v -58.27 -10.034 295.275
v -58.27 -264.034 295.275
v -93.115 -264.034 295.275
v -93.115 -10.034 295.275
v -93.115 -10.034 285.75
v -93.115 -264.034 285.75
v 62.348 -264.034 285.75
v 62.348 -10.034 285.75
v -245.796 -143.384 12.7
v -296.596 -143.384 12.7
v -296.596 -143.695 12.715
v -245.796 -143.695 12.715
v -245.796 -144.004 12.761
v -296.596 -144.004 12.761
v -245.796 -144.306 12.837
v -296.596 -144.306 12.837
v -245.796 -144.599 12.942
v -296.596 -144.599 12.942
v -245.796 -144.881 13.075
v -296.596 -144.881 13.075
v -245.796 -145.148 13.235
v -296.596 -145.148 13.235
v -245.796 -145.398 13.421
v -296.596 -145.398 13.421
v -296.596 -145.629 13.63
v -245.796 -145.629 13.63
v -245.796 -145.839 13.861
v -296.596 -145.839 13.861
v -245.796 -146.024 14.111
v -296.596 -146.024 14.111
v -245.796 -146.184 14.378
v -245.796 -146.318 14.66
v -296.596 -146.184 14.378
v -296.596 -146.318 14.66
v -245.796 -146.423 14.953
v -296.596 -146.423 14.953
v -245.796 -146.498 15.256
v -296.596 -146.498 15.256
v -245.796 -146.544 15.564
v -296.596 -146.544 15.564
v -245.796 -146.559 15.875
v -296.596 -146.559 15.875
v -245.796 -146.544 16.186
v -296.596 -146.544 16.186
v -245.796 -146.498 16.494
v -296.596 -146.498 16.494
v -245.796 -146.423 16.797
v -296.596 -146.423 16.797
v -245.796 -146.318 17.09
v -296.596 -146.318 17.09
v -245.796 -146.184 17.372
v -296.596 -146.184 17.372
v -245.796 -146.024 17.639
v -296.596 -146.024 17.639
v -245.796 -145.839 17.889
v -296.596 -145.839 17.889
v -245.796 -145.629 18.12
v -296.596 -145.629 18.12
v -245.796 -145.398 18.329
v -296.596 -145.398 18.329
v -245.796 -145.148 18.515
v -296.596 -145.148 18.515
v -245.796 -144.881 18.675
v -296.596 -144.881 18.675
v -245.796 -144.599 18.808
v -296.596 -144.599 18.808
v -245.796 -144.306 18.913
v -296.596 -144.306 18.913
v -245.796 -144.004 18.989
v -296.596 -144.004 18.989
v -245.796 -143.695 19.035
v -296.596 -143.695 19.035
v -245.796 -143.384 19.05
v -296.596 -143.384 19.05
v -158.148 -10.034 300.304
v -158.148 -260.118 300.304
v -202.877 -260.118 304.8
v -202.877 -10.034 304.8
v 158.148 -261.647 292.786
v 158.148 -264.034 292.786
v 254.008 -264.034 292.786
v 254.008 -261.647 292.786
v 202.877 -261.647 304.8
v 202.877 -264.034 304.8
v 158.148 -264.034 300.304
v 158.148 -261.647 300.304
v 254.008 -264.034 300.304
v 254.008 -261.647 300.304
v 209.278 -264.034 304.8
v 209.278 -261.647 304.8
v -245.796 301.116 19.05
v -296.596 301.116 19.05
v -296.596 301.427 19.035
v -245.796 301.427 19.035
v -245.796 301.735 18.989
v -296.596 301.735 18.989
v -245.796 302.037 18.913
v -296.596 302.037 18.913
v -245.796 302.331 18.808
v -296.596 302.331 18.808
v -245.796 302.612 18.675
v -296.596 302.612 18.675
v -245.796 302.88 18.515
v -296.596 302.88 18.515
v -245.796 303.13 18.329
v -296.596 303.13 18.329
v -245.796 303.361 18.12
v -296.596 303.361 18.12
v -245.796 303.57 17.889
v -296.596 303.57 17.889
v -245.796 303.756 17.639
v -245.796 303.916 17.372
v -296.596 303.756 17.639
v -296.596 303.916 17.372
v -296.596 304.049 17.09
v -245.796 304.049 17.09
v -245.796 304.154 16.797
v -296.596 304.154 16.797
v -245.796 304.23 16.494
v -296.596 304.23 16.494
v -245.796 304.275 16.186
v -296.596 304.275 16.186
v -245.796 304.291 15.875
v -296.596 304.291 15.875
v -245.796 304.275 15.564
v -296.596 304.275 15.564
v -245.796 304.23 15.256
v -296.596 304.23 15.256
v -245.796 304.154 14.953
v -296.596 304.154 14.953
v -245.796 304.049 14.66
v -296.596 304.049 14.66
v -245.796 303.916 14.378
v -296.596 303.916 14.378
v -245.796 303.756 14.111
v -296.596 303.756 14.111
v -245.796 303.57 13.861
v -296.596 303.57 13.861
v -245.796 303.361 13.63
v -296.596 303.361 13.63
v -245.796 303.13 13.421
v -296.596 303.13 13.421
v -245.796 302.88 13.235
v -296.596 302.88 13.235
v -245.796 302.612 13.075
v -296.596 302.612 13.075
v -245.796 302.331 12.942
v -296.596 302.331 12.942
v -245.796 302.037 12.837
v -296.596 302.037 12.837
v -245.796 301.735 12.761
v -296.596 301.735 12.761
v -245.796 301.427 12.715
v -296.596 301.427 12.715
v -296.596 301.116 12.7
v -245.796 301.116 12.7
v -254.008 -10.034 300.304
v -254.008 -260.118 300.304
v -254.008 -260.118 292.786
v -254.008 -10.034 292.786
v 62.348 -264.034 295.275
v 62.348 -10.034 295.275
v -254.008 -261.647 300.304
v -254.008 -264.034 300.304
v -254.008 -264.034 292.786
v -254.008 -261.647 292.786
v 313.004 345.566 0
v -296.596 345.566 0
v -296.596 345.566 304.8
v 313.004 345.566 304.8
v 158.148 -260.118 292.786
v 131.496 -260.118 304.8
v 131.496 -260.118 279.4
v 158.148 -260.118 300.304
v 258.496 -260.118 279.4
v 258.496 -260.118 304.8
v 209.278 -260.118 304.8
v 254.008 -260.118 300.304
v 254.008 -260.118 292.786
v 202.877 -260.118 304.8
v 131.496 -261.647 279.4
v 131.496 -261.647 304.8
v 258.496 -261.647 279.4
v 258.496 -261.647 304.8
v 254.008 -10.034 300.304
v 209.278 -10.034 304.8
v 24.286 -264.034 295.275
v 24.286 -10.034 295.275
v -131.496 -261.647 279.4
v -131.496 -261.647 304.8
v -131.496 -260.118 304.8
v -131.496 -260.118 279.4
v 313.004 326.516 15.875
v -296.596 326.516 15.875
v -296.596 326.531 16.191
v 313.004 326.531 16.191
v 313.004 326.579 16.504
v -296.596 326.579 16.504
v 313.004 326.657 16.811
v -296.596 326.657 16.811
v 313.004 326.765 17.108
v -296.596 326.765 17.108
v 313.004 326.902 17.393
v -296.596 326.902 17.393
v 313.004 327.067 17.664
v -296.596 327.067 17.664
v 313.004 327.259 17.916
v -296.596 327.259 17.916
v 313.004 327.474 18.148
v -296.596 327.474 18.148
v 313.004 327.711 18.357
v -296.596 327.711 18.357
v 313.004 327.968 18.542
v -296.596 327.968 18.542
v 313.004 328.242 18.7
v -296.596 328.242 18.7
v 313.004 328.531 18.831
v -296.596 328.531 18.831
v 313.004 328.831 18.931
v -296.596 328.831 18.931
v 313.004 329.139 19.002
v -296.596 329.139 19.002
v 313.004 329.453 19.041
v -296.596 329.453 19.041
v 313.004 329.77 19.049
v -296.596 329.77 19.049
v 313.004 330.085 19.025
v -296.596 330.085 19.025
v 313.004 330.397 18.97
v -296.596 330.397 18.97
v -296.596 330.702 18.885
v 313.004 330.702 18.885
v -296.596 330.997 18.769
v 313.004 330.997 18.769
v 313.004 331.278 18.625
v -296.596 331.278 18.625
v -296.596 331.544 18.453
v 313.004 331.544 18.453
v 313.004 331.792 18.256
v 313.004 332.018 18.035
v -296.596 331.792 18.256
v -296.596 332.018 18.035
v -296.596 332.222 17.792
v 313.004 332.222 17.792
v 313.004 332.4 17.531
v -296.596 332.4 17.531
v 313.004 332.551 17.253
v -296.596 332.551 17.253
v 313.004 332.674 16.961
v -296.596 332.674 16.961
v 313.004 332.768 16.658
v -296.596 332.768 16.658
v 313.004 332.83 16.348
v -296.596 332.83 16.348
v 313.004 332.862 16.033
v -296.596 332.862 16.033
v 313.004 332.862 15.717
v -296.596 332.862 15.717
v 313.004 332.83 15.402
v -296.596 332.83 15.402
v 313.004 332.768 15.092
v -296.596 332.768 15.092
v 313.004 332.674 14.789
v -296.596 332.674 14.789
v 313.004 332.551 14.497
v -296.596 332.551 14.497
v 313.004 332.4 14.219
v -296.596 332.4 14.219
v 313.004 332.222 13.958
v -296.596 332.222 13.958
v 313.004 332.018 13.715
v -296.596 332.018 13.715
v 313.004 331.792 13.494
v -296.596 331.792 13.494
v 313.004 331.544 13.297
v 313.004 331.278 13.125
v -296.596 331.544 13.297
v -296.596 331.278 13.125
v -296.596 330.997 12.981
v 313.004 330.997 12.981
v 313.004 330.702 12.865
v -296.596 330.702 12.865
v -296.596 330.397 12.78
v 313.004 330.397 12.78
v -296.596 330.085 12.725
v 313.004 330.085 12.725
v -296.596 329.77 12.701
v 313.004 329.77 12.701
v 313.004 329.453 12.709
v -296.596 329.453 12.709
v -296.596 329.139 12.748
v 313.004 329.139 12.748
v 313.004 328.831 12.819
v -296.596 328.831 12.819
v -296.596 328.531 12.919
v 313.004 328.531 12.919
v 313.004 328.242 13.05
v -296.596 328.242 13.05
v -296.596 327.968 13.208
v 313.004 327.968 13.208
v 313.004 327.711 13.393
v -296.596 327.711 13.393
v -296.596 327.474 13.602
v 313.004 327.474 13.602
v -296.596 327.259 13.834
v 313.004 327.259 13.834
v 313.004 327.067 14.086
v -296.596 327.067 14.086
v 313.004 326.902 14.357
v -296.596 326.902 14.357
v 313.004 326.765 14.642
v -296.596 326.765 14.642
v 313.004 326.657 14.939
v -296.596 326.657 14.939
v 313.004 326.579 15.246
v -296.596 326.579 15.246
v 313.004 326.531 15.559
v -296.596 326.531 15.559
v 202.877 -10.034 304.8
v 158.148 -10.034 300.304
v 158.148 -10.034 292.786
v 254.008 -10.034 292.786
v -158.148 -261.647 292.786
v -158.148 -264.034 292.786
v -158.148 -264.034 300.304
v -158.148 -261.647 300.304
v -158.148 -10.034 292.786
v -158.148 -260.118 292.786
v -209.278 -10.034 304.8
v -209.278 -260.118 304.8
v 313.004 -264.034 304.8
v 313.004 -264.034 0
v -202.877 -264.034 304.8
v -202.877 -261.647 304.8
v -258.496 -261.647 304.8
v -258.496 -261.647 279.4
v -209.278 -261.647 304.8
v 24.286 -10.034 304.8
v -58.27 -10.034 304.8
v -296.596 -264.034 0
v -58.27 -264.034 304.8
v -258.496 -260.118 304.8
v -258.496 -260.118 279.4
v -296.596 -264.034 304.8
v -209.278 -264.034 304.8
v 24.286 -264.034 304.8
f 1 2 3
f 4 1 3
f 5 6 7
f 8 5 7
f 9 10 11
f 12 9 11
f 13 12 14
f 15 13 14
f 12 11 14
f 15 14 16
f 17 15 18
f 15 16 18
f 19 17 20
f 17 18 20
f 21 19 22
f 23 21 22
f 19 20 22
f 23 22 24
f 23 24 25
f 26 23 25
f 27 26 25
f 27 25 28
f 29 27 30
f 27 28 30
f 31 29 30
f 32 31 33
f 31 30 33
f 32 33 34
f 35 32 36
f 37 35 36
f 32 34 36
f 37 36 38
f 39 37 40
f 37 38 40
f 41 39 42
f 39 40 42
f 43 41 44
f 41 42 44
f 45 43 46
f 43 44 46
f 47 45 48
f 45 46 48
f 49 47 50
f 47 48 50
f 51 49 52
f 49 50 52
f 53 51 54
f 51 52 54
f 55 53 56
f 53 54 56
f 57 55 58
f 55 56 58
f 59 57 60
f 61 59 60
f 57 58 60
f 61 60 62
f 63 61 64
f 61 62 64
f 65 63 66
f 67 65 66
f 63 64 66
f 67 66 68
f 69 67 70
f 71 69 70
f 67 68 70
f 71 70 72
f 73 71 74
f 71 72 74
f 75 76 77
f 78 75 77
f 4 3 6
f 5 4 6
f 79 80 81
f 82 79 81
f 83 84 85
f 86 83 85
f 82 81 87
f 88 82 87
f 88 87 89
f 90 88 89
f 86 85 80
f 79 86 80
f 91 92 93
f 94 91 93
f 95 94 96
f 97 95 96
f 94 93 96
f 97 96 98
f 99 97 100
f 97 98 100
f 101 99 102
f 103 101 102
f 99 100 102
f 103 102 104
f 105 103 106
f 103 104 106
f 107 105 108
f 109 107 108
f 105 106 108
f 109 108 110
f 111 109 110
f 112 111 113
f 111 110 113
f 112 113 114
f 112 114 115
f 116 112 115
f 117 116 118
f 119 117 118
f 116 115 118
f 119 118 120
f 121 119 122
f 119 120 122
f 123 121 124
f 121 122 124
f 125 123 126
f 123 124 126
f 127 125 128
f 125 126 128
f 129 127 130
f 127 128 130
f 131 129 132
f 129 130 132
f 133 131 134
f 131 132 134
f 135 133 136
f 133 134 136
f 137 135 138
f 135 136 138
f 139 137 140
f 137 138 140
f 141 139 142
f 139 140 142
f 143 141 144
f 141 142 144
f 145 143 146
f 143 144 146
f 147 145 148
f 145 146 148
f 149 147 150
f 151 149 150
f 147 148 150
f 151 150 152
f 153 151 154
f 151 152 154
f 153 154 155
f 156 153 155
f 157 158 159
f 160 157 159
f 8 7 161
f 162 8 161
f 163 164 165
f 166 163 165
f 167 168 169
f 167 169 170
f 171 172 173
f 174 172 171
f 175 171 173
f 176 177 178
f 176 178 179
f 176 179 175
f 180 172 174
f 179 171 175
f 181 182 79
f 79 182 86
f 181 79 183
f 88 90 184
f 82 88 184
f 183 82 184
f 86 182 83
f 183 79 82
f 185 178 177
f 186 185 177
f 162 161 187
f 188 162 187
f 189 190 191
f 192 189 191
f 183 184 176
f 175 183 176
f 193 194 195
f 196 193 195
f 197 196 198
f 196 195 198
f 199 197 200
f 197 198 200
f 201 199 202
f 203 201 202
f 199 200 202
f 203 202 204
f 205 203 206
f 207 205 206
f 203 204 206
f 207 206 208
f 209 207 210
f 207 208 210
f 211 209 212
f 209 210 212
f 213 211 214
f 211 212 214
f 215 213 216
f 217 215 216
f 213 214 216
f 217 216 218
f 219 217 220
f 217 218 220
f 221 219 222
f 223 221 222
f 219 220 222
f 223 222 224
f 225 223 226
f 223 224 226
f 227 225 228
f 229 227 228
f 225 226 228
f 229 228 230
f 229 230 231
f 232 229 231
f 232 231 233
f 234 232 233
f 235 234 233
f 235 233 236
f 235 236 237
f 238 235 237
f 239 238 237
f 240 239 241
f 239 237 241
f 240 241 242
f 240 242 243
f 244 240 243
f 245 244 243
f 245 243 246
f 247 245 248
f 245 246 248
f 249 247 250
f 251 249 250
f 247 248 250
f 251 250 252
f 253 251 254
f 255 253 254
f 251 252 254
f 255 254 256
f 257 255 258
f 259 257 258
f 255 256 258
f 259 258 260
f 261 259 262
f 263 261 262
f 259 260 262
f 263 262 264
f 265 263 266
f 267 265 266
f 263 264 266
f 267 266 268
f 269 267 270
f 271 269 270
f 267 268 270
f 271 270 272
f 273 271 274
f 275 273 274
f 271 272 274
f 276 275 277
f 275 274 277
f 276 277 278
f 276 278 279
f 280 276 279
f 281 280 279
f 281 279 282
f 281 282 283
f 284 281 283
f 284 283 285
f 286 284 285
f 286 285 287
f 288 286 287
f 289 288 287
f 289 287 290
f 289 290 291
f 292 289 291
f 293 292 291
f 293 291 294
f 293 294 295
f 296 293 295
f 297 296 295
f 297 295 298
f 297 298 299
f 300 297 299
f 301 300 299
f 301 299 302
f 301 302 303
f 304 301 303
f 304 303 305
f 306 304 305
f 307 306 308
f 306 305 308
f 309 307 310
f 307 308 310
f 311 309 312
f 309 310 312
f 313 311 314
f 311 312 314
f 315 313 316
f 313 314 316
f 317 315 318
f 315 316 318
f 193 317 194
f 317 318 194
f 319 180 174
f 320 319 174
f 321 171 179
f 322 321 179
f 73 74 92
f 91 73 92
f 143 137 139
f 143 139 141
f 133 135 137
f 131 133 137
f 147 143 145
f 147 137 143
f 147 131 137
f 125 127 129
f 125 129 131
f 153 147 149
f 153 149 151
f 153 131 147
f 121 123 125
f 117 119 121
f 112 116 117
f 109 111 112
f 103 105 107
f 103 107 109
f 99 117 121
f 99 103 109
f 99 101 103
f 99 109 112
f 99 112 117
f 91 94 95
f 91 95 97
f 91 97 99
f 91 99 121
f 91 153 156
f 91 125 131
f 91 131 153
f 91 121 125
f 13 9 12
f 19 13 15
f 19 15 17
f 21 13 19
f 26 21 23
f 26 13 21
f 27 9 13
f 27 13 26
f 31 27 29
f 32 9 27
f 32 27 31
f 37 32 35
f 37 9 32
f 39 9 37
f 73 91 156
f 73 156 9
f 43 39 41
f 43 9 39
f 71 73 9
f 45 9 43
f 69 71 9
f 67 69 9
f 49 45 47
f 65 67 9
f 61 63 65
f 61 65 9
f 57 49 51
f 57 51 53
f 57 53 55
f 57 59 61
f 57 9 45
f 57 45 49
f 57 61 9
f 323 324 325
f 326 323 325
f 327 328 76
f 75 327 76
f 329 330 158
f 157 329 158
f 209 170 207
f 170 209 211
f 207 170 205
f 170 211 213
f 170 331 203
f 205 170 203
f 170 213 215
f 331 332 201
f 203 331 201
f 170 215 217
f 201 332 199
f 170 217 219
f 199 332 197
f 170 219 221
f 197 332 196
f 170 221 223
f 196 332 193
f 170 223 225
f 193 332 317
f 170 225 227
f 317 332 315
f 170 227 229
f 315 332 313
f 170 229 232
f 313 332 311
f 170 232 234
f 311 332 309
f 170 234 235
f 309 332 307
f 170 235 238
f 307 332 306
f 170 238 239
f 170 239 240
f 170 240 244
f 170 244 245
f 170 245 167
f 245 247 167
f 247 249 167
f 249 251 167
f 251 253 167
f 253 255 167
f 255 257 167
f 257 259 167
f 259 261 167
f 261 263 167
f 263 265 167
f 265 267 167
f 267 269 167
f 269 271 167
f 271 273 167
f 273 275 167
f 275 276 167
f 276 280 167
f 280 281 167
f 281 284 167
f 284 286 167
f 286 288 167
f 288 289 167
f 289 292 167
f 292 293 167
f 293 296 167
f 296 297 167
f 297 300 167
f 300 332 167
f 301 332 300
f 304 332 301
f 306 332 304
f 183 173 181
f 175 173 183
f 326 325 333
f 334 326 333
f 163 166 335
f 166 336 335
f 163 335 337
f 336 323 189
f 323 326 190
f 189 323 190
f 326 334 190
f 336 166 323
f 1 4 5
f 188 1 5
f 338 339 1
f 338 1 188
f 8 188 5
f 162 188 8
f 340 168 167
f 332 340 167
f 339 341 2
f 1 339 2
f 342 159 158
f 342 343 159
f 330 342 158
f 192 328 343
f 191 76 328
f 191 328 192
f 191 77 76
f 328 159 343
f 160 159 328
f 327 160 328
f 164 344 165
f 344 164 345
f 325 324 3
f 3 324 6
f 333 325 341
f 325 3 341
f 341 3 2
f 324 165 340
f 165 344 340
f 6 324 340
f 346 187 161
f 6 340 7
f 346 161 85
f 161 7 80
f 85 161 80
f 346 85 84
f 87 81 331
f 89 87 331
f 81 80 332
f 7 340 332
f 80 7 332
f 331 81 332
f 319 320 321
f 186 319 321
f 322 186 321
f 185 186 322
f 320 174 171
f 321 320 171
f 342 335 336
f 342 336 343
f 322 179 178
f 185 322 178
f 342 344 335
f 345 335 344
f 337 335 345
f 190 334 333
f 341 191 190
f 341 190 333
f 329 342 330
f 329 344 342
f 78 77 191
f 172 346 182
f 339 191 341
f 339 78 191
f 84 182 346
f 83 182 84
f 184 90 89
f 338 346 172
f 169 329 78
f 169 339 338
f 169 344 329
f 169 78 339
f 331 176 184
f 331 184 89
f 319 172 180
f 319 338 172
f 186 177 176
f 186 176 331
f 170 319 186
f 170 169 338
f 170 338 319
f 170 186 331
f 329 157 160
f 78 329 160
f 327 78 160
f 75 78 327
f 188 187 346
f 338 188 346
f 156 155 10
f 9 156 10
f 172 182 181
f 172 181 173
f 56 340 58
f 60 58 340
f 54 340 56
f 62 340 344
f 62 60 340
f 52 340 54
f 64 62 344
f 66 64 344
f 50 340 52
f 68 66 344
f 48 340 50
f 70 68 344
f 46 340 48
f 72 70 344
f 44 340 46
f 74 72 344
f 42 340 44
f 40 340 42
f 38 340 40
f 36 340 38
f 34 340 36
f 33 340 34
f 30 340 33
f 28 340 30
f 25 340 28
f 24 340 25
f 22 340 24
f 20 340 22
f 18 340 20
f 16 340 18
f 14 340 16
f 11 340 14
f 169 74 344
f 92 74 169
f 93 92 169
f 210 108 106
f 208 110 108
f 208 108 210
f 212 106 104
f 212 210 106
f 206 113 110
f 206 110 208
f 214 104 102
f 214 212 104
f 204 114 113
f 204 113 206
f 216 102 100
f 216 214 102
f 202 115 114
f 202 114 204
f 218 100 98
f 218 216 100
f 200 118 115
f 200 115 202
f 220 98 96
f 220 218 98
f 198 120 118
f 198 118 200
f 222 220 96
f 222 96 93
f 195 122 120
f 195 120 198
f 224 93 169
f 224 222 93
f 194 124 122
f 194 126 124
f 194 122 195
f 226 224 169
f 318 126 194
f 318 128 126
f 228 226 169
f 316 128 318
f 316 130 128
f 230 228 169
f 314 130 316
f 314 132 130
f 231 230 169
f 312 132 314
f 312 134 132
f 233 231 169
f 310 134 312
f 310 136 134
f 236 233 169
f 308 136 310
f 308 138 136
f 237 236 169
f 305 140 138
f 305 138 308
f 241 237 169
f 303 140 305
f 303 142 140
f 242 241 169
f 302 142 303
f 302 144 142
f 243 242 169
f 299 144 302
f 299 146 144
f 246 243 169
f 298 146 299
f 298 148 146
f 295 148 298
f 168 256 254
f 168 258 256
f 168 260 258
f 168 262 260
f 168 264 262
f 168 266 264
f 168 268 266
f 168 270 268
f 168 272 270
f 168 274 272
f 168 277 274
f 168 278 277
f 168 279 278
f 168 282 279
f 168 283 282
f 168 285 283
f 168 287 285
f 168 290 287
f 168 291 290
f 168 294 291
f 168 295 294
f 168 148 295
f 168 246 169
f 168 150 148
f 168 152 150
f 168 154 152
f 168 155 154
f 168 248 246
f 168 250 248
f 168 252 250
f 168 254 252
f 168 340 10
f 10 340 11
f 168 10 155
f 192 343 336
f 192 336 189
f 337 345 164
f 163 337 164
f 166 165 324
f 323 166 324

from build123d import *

# Parameters (mm, degrees)
F0_W     = 609.6
F0_H     = 609.6
F1_DEPTH = 304.8
F2_R     = 3.175
F3_DEPTH = 609.6
F5_DEPTH = 50.8
F7_DEPTH = 254
F8_W     = 127
F8_H     = 1.5291
F9_DEPTH = 25.4


with BuildPart() as f1:
    # F0 (on Top) → F1 (new body)
    with BuildSketch(Plane.XY):
        with Locations((8.20379, 40.765707)):
            Rectangle(F0_W, F0_H)
    extrude(amount=F1_DEPTH)

    # F2 (on face) → F3 (cut)
    with BuildSketch(Plane(origin=(-296.59621, 0, 0), x_dir=(0, -1, 0), z_dir=(-1, 0, 0))):
        with Locations((-329.690707, 15.875)):
            Circle(F2_R)
    extrude(amount=-F3_DEPTH, mode=Mode.SUBTRACT)

    # F4 (on face) → F5 (cut)
    with BuildSketch(Plane(origin=(-296.59621, 0, 0), x_dir=(0, -1, 0), z_dir=(-1, 0, 0))):
        with BuildLine():
            Line((143.384293, 19.05), (-301.115707, 19.05))
            ThreePointArc((-301.115707, 19.05), (-304.290707, 15.875), (-301.115707, 12.7))
            Line((-301.115707, 12.7), (143.384293, 12.7))
            ThreePointArc((143.384293, 12.7), (146.559293, 15.875), (143.384293, 19.05))
        make_face()
    extrude(amount=-F5_DEPTH, mode=Mode.SUBTRACT)

    # F6 (on face) → F7 (cut)
    with BuildSketch(Plane.XZ.offset(264.034293)):
        Polygon((254.007536, 300.3042), (209.278136, 304.8), (202.877336, 304.8), (158.147936, 300.3042), (158.147936, 292.7858), (254.007536, 292.7858), align=None)
        Polygon((-254.007536, 292.7858), (-158.147936, 292.7858), (-158.147936, 300.3042), (-202.877336, 304.8), (-209.278136, 304.8), (-254.007536, 300.3042), align=None)
        Polygon((24.286199, 295.275), (24.286199, 304.8), (-58.270179, 304.8), (-58.270179, 295.275), (-93.115404, 295.275), (-93.115404, 285.75), (62.347908, 285.75), (62.347908, 295.275), align=None)
    extrude(amount=-F7_DEPTH, mode=Mode.SUBTRACT)

    # F8 (on face) → F9 (cut)
    with BuildSketch(Plane.XY.offset(304.8)):
        with Locations((-194.99621, -260.882653)):
            Rectangle(F8_W, F8_H)
        with Locations((194.99621, -260.882653)):
            Rectangle(F8_W, F8_H)
    extrude(amount=-F9_DEPTH, mode=Mode.SUBTRACT)


solid = f1.part
